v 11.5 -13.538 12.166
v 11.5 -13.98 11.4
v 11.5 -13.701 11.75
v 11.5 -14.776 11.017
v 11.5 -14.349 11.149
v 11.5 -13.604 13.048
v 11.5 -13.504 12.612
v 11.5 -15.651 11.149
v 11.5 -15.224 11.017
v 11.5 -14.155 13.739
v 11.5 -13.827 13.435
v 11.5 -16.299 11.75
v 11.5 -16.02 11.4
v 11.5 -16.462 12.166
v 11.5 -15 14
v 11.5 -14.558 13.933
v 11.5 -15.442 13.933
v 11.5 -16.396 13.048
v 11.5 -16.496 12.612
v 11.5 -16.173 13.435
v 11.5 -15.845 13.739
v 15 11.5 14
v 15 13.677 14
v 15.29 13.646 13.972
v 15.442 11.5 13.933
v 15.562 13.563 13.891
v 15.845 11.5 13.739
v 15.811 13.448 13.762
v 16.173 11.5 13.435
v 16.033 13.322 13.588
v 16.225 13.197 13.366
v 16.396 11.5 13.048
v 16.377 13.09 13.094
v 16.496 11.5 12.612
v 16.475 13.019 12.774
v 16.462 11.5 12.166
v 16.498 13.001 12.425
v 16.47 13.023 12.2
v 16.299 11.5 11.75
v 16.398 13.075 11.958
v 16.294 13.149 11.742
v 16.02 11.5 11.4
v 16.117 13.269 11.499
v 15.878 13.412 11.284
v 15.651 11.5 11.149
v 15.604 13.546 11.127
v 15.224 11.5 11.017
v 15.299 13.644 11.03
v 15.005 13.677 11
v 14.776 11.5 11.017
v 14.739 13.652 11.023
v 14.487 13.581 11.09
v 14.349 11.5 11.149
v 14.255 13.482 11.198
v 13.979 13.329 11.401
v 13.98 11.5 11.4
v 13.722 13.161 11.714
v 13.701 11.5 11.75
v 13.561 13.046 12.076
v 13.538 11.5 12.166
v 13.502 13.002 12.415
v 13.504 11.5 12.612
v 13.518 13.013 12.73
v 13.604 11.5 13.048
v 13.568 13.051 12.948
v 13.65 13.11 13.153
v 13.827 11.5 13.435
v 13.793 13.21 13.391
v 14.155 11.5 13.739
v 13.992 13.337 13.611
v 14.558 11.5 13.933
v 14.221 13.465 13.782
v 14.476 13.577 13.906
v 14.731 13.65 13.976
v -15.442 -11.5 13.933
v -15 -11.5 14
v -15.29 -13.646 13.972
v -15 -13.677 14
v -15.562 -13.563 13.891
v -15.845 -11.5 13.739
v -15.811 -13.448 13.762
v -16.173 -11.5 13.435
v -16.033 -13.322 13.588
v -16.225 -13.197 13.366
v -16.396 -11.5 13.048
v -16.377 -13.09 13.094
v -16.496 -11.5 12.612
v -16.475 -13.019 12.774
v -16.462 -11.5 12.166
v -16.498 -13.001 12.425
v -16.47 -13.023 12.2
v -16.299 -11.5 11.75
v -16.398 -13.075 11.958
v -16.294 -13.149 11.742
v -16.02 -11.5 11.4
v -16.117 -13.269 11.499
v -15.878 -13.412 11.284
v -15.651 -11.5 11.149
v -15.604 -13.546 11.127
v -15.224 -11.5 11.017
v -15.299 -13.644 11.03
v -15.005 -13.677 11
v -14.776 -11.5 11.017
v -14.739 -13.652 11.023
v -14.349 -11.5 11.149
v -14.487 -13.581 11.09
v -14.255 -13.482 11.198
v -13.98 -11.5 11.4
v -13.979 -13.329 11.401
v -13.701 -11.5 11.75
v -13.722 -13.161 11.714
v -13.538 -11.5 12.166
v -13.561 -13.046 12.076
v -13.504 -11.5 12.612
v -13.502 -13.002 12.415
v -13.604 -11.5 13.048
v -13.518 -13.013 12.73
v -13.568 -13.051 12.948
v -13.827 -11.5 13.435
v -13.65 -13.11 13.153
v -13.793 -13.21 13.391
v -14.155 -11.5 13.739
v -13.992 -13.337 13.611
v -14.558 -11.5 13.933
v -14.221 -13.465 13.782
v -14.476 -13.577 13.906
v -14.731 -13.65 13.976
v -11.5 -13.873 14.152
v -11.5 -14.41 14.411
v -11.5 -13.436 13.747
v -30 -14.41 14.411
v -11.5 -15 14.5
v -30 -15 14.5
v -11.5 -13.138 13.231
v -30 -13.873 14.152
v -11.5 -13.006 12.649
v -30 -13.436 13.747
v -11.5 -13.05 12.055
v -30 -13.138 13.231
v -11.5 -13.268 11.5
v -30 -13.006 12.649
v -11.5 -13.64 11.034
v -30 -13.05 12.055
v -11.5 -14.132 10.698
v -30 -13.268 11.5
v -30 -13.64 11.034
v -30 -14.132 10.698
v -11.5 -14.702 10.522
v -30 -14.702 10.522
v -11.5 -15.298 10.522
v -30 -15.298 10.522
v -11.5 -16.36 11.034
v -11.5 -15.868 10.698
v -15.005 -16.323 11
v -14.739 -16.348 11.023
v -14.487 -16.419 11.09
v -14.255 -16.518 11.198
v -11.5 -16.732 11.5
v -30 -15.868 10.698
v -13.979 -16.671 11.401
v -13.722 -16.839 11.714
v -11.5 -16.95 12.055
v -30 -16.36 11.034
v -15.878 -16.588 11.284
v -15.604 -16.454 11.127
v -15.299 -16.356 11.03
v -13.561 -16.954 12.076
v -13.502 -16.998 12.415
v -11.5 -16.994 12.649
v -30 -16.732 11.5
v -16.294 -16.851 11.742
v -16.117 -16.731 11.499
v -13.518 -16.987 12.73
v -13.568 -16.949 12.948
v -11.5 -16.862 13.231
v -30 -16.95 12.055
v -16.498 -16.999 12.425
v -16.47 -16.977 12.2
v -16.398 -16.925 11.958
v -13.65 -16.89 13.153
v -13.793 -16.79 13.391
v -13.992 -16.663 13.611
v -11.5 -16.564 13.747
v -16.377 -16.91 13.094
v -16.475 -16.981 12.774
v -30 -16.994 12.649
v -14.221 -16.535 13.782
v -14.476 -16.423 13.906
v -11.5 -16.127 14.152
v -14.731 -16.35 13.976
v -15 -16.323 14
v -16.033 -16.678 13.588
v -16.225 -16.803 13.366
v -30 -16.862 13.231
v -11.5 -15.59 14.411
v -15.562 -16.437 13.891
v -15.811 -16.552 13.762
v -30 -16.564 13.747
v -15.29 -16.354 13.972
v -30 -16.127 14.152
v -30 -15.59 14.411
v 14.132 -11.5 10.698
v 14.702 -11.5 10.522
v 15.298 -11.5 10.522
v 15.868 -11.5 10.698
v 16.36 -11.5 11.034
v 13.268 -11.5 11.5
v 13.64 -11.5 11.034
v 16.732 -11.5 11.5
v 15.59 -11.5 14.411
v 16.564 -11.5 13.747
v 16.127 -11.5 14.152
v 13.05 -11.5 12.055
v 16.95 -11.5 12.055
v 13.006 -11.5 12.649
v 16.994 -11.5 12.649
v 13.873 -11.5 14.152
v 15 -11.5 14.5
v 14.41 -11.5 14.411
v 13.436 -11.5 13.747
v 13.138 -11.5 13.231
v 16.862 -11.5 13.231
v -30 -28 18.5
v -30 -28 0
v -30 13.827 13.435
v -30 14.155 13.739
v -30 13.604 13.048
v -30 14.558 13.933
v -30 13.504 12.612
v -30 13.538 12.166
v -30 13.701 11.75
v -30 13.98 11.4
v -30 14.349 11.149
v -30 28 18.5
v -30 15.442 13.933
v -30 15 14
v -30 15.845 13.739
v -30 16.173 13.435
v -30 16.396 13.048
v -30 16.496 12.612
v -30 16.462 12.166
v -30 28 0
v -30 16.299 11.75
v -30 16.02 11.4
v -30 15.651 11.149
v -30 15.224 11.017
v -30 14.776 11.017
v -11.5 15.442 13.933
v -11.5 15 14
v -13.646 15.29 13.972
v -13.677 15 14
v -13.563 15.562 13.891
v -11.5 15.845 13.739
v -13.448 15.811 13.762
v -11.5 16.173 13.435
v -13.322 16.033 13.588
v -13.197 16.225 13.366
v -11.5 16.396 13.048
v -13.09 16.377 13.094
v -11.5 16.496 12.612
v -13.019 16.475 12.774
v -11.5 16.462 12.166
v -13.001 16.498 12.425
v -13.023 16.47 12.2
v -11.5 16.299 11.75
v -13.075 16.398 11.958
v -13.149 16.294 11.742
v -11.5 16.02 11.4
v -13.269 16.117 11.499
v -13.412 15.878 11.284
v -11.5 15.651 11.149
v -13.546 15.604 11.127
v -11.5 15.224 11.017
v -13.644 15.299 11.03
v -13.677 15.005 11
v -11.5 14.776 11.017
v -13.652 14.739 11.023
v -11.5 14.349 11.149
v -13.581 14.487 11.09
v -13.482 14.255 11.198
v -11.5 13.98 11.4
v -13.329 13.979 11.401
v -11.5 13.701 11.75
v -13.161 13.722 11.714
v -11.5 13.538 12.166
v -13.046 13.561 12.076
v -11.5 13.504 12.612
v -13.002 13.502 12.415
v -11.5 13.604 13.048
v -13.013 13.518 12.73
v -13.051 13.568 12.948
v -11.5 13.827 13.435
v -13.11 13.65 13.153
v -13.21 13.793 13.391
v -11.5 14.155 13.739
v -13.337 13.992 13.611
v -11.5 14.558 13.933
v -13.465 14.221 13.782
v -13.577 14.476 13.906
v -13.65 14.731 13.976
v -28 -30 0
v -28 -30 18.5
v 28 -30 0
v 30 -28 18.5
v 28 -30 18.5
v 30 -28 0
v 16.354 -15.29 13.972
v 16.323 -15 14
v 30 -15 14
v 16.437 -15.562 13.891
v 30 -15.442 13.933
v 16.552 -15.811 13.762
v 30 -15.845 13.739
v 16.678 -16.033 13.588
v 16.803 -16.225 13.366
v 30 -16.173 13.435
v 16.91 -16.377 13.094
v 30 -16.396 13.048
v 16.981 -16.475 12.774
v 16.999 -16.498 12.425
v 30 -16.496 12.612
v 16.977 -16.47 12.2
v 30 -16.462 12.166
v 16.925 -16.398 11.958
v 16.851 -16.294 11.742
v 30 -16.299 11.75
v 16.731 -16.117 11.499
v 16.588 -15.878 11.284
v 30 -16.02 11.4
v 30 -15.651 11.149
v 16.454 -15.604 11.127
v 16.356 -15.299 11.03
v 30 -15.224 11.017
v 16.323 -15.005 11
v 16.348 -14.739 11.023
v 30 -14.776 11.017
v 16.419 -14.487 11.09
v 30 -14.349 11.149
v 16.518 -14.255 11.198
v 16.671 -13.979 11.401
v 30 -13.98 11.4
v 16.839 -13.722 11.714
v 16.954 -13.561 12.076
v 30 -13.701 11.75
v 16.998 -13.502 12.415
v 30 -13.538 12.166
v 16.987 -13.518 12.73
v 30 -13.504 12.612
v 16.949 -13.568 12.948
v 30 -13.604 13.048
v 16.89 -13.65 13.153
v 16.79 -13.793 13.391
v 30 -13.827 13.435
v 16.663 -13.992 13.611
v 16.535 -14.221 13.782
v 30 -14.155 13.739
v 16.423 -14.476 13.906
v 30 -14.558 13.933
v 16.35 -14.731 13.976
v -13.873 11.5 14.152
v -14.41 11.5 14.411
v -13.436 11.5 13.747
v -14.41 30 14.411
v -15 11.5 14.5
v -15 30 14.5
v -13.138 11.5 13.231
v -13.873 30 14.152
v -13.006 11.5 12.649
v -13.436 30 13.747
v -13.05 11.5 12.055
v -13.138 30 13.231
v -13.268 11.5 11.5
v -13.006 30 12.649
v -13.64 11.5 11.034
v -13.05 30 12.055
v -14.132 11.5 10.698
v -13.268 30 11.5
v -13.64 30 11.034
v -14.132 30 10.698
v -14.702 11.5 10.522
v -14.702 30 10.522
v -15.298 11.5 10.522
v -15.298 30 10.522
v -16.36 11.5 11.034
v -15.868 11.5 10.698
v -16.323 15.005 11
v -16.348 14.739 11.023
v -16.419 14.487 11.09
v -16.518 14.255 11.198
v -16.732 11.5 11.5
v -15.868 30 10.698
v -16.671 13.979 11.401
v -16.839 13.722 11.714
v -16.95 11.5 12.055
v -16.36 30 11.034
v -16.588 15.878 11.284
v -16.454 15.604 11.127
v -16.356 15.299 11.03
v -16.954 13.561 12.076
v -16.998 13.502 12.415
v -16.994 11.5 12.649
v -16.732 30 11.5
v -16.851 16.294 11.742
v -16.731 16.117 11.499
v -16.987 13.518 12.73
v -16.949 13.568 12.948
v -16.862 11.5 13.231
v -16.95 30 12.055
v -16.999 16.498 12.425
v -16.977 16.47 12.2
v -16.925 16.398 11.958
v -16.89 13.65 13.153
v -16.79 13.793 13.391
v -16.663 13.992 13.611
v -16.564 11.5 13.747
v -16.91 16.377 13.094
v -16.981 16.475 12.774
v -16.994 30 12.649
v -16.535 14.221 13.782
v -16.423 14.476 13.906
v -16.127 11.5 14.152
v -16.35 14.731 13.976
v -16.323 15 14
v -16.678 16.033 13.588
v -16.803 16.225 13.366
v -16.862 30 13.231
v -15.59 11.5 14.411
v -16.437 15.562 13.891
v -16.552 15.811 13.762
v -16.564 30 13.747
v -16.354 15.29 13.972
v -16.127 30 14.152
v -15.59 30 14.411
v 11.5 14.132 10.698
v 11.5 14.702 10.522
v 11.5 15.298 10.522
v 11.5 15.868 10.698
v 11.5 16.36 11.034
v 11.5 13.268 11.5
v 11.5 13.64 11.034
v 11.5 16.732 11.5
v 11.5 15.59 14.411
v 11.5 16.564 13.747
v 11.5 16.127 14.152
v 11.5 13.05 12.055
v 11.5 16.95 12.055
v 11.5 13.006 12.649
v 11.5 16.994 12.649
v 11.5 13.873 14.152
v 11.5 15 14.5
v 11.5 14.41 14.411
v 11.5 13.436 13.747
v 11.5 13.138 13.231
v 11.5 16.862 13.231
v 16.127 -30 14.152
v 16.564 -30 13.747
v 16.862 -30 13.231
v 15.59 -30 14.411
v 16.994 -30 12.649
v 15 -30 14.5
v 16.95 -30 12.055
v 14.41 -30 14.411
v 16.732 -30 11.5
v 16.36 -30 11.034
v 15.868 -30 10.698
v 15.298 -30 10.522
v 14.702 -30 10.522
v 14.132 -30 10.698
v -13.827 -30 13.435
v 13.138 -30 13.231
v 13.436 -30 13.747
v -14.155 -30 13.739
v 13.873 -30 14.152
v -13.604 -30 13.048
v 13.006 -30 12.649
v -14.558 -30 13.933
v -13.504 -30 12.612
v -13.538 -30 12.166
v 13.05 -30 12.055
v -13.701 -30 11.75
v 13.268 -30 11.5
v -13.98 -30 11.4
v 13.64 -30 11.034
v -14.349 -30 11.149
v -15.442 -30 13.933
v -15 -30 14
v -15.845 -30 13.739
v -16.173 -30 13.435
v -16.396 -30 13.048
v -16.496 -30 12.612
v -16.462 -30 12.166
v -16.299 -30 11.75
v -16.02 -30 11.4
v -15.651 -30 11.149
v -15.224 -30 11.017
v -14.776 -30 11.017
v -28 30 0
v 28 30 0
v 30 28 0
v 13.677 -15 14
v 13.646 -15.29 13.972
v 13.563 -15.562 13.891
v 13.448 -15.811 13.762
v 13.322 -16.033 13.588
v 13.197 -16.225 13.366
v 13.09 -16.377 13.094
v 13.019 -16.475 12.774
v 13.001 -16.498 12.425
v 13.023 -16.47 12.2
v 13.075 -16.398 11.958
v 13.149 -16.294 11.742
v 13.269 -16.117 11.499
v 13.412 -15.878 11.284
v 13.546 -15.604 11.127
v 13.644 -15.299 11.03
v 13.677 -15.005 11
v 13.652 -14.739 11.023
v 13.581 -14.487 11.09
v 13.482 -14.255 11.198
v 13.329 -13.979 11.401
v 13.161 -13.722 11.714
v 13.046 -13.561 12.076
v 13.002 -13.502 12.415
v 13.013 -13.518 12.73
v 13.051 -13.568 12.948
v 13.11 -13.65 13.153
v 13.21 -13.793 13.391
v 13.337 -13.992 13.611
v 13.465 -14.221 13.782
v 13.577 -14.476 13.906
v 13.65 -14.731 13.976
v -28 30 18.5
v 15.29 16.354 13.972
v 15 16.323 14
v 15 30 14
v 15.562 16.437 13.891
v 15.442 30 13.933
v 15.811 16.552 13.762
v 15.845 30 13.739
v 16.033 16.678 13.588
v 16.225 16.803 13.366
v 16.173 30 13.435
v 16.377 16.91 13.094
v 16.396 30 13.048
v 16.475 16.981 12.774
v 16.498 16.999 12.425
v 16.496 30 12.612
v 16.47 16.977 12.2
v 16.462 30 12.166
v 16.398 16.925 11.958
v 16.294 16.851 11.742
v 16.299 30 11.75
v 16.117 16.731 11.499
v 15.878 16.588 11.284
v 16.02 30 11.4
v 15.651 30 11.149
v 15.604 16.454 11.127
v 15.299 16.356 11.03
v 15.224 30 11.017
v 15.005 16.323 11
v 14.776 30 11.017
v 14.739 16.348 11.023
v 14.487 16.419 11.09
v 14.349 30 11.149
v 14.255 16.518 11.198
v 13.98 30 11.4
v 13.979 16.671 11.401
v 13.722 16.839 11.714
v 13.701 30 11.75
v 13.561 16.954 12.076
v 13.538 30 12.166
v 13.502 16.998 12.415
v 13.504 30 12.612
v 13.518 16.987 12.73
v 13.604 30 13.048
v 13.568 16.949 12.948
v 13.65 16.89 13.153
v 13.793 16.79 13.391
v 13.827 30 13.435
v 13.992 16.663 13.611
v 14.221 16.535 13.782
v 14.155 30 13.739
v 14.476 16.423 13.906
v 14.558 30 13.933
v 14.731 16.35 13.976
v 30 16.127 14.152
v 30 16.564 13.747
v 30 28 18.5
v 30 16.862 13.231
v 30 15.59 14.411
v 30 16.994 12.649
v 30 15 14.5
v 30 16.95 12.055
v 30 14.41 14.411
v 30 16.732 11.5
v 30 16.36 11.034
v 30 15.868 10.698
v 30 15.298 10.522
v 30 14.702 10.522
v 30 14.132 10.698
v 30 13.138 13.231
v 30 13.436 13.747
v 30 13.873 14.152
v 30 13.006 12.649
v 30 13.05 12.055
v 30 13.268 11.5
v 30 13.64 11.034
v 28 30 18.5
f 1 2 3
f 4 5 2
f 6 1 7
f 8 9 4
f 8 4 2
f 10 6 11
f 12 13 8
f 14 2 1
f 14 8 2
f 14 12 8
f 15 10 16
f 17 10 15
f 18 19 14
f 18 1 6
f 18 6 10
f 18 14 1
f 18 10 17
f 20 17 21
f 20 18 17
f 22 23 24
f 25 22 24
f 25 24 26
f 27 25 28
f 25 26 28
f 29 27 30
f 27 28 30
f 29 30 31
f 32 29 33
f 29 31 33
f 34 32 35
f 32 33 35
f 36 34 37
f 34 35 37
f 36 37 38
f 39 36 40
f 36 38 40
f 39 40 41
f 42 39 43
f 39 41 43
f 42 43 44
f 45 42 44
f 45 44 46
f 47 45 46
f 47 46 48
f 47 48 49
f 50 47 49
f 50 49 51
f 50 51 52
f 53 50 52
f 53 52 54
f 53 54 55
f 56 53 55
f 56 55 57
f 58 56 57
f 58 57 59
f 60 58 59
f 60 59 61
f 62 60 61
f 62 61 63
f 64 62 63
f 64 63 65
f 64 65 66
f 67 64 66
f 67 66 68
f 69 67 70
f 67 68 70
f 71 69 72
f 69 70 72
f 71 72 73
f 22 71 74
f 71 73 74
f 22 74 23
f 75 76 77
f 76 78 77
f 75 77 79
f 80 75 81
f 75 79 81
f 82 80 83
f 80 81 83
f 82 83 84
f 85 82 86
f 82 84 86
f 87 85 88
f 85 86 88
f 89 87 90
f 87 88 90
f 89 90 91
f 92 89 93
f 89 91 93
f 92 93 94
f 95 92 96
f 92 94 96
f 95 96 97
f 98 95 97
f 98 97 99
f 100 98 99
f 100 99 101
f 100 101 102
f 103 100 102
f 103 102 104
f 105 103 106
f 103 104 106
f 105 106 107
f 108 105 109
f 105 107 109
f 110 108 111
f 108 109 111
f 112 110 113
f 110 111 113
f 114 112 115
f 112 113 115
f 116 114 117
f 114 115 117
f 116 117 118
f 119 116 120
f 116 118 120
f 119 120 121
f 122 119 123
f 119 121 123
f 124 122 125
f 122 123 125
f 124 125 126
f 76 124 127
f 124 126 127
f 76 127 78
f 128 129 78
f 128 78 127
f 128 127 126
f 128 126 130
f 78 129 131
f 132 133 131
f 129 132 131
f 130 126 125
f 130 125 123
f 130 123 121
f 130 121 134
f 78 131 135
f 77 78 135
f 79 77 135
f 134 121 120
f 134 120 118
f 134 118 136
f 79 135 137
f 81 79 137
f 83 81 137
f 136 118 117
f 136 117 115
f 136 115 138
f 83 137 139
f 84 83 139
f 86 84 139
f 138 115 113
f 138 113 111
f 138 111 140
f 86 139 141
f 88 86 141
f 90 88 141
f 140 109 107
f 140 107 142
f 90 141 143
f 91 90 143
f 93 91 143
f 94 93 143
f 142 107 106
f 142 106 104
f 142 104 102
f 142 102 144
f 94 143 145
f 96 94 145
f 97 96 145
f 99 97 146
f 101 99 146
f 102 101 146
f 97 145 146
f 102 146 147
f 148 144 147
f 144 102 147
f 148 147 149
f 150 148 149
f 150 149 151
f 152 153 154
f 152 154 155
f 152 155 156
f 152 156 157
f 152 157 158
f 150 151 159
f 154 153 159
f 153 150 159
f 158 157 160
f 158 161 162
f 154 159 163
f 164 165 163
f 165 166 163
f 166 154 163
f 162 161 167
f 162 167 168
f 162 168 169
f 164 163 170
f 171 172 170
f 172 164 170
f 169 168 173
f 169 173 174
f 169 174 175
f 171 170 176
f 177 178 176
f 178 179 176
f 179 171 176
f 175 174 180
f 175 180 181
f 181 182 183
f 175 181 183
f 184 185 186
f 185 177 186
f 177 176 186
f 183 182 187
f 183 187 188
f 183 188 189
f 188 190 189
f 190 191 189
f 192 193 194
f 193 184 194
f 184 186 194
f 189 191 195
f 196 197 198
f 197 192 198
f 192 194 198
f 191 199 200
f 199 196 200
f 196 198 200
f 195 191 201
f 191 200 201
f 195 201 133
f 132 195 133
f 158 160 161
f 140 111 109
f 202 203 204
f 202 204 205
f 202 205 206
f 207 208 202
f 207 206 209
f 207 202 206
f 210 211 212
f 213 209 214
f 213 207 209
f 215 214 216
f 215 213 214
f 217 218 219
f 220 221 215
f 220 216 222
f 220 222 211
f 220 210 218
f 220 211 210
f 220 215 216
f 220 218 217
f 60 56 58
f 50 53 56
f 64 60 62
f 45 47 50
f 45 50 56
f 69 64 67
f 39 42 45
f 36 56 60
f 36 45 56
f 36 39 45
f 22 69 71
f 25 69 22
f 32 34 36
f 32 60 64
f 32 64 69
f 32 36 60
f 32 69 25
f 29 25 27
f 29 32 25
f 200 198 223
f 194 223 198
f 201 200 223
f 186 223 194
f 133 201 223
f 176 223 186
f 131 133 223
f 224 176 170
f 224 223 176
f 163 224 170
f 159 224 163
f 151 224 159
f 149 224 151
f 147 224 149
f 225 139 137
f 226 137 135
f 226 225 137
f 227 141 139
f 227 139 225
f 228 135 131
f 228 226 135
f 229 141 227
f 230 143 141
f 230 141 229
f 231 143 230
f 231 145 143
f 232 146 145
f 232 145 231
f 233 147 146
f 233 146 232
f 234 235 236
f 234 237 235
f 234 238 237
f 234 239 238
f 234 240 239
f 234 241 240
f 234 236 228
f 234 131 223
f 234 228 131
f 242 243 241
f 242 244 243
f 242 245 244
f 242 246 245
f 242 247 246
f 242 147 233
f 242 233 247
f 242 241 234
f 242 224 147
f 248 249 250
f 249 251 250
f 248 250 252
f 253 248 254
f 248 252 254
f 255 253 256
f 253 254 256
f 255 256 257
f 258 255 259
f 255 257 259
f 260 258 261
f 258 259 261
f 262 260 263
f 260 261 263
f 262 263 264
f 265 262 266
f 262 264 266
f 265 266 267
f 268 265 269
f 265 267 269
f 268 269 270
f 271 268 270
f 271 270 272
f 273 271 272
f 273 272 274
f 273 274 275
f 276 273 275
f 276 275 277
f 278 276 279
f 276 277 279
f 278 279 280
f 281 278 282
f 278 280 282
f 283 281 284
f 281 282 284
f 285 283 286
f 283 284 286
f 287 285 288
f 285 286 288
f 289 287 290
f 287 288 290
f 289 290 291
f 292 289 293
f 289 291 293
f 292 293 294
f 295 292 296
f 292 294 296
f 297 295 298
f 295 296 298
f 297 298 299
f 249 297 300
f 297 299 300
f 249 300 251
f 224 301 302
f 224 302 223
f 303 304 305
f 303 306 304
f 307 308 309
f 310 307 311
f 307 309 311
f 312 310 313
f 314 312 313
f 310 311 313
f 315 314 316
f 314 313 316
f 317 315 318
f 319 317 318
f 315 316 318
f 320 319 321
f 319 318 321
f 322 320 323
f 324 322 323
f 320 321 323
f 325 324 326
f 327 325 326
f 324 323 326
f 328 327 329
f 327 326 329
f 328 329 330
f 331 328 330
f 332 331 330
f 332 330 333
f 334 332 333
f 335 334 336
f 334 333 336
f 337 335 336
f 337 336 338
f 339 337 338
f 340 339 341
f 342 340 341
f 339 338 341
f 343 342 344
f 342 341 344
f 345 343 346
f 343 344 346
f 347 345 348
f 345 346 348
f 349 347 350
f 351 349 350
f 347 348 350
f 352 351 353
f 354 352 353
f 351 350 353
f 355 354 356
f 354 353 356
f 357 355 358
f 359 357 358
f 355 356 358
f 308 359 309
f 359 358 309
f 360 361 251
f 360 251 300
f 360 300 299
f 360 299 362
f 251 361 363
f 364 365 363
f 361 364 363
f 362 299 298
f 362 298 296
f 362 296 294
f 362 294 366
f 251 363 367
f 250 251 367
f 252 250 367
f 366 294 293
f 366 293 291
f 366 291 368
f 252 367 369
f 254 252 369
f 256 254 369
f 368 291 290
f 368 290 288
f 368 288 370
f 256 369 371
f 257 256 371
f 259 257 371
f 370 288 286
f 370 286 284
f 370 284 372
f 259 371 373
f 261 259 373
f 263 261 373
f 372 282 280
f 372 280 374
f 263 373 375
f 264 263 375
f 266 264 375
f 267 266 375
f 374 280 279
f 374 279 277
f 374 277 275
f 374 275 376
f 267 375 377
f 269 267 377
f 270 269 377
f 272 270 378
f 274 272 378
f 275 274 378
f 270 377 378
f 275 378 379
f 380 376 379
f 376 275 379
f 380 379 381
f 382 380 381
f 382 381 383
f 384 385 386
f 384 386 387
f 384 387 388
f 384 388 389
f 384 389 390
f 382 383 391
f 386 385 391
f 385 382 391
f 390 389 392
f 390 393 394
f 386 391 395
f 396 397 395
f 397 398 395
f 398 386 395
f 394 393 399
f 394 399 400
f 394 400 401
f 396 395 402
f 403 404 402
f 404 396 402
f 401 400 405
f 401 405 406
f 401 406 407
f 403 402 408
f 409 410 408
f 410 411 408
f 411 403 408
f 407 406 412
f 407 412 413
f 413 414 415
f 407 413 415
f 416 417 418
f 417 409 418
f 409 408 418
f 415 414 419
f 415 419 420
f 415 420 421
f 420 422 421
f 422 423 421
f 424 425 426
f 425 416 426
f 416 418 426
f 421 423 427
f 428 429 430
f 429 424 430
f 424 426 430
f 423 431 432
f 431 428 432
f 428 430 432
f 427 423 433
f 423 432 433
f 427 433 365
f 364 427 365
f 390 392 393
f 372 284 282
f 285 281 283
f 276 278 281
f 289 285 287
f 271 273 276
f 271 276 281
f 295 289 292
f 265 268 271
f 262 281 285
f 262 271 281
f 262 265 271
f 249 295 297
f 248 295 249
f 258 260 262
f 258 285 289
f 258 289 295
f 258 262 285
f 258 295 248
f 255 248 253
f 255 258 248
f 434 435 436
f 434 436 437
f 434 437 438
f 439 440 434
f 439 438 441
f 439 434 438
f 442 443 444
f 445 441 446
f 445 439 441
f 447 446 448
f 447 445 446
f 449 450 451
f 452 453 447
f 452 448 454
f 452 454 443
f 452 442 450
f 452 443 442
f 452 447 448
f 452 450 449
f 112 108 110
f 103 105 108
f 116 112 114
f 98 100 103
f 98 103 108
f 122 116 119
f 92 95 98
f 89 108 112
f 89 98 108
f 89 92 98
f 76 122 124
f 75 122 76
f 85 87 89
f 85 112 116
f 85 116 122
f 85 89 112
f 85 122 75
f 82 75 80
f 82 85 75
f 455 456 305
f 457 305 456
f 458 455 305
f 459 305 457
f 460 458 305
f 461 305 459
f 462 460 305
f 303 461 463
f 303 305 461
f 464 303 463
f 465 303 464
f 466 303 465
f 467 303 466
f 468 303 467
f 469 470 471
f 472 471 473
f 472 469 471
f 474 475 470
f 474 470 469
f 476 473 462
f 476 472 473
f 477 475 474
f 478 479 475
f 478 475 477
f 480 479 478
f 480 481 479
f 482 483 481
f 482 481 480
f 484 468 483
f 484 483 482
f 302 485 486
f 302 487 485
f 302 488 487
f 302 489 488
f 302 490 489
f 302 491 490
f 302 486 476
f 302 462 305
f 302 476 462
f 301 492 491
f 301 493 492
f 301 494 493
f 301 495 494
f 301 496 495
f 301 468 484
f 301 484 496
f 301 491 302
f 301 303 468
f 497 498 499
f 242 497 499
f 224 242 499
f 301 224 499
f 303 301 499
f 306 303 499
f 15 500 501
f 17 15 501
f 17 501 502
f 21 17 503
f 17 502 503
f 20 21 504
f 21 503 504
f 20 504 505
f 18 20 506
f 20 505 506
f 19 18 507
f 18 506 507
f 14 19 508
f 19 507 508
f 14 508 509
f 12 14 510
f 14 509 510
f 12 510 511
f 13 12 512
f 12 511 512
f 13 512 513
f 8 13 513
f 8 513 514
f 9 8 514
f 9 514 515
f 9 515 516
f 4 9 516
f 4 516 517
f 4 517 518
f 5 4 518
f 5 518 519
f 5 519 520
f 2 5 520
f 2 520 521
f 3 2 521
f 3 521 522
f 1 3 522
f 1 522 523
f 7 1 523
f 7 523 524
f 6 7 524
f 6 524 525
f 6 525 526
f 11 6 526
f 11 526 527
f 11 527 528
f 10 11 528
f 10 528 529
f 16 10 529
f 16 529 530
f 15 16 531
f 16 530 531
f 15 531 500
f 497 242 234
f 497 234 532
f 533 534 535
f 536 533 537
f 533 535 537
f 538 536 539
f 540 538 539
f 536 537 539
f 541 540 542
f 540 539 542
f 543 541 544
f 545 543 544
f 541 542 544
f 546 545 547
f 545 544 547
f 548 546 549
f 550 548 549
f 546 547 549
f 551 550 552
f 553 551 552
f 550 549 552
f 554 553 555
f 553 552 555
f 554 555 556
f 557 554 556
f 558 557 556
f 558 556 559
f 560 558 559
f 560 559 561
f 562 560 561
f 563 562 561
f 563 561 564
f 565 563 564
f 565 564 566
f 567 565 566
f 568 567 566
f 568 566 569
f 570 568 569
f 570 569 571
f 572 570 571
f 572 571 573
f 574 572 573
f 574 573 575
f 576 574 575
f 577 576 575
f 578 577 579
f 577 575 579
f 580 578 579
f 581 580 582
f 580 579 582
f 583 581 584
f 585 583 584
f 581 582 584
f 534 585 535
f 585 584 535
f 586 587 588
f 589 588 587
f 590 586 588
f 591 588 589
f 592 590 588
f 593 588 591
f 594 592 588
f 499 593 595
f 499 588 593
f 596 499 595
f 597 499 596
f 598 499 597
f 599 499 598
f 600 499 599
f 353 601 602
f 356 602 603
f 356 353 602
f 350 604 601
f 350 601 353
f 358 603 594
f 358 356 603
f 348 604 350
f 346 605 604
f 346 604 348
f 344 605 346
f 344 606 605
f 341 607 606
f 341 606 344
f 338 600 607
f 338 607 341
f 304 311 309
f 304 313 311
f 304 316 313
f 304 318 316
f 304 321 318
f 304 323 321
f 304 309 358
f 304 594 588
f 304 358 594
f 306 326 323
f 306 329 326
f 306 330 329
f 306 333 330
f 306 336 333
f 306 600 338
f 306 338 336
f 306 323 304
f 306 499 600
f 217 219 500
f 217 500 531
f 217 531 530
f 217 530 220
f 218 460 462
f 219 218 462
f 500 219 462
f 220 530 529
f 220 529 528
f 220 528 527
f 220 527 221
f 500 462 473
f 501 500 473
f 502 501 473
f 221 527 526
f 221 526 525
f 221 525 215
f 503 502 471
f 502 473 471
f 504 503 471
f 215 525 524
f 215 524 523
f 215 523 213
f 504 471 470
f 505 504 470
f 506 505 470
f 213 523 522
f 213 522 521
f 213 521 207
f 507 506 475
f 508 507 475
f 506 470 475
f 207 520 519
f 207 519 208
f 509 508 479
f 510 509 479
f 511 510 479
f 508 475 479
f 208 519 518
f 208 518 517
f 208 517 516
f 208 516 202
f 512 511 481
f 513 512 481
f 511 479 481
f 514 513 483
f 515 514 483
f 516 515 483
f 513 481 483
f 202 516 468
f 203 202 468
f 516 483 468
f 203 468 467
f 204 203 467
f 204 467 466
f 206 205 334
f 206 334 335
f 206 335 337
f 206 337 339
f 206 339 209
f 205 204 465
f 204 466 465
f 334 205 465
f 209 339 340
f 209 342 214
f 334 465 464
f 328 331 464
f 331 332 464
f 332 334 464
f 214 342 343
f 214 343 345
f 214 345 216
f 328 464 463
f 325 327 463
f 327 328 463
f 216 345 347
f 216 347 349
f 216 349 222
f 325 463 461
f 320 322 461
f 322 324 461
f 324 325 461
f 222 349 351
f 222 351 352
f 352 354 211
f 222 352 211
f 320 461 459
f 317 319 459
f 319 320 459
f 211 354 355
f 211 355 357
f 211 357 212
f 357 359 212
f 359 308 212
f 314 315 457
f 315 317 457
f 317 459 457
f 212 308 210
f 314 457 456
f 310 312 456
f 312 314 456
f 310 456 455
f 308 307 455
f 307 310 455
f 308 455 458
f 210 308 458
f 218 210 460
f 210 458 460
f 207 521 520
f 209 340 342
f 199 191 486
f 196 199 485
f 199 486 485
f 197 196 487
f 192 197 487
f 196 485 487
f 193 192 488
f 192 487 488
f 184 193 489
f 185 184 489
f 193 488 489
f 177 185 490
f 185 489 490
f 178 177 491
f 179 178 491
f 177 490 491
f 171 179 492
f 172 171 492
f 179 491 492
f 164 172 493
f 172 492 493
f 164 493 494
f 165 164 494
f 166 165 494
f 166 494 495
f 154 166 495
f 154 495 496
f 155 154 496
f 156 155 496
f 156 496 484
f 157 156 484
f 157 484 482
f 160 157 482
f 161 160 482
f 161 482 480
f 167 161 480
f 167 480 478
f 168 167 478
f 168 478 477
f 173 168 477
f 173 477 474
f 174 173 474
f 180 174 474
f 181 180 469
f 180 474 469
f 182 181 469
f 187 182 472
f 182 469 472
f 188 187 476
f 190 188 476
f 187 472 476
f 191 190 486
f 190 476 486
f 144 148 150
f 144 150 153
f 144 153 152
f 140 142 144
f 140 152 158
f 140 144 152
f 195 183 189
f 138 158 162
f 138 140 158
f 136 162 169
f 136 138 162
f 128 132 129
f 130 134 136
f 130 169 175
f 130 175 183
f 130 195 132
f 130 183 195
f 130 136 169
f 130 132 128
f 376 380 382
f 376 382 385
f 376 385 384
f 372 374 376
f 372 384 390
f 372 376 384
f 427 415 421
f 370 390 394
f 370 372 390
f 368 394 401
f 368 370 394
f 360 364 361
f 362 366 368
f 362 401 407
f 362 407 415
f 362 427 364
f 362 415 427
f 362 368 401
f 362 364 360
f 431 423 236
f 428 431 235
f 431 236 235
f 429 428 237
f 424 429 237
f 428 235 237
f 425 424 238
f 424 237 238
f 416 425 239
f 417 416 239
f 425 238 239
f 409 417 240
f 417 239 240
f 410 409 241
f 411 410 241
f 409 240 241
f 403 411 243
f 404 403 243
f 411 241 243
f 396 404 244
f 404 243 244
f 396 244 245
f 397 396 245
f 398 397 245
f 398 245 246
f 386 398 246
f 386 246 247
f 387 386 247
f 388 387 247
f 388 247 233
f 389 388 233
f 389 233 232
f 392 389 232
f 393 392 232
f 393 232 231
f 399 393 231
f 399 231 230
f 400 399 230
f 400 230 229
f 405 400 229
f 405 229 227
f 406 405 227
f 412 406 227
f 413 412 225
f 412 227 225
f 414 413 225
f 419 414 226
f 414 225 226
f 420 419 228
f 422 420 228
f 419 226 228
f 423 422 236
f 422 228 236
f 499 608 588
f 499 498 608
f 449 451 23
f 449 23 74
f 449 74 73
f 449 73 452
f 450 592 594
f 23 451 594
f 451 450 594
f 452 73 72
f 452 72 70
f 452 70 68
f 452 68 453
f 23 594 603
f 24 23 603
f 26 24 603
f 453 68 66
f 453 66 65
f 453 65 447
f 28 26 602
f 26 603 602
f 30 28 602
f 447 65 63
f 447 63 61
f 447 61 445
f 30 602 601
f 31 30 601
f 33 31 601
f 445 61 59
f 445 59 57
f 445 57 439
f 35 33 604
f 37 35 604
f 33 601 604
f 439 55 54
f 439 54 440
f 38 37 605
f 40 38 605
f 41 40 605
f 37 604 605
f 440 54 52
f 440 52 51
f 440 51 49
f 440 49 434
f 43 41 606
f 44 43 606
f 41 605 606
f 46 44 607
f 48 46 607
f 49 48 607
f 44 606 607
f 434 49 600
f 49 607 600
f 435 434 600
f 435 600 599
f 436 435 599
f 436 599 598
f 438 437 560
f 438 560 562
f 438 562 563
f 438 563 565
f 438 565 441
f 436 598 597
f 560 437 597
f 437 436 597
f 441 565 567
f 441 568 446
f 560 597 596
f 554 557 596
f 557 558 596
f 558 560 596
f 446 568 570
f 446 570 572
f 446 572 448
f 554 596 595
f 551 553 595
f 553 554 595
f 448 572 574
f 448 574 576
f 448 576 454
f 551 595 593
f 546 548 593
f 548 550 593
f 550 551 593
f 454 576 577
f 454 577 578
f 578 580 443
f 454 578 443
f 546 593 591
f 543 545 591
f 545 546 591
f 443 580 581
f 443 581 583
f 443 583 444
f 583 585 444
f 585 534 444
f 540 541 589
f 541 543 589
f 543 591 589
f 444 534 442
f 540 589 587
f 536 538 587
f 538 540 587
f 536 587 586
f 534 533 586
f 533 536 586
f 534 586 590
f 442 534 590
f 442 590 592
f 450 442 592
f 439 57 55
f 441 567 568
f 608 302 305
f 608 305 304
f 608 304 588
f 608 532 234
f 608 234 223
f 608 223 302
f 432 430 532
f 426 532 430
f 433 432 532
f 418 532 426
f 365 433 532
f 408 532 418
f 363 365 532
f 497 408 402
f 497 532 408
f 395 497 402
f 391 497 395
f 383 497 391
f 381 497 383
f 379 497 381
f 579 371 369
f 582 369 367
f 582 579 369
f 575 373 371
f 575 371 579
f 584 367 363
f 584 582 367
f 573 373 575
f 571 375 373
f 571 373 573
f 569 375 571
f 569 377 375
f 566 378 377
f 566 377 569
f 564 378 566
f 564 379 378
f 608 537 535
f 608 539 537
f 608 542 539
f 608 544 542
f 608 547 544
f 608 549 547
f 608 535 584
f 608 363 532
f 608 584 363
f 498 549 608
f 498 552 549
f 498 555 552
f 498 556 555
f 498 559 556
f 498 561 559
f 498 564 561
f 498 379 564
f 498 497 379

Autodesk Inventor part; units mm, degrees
ref_plane "YZ Plane" through (0, 0, 0) normal (1, 0, 0) x (0, 1, 0)
ref_plane "XZ Plane" through (0, 0, 0) normal (0, 1, 0) x (-1, 0, 0)
ref_plane "XY Plane" through (0, 0, 0) normal (0, 0, 1) x (1, 0, 0)
ref_plane "Work Plane1" through (0, 0, 0) normal (0, 0, 1) x (1, 0, 0)
sketch "Sketch1" plane through (0, 0, 0) normal (0, 0, 1) x (1, 0, 0)
  circle A0 centre (0, 0) radius 7.5 projected
  line L0 (-30, 28) -> (-28, 30) projected
  line L1 (-30, -28) -> (-30, 28) projected
  line L2 (-28, -30) -> (-30, -28) projected
  line L3 (28, -30) -> (-28, -30) projected
  line L4 (30, -28) -> (28, -30) projected
  line L5 (30, 28) -> (30, -28) projected
  line L6 (28, 30) -> (30, 28) projected
  line L7 (-28, 30) -> (28, 30) projected
  circle A1 centre (25, 25) radius 2.325 projected
  circle A2 centre (-25, -25) radius 2.325 projected
  circle A3 centre (25, -25) radius 2.325 projected
  circle A4 centre (-25, 25) radius 2.325 projected
  point P0 (0, 0)
extrude "Extrusion1" add sketch "Sketch1" along normal blind 18.5 contours A0 | L0 L7 L6 L5 L4 L3 L2 L1 | A1 | A2 | A3 | A4
sketch "Sketch2" plane through (0, 0, 18.5) normal (0, 0, 1) x (1, 0, 0)
  point P0 (0, 0)
sketch "Sketch3" plane through (30, -28, 0) normal (1, 0, 0) x (0, 0, -1)
  line L0 (0, 56) -> (0, 0) projected
  line L1 (0, 56) -> (-18.5, 56) projected
  line L2 (-18.5, 0) -> (-18.5, 56) projected
  line L3 (0, 0) -> (-18.5, 0) projected
  line L4 (-18.5, 0) -> (-18.5, 56) projected
  line L5 (0, 47.2331) -> (-18.5, 47.2331)
  line L6 (-18.5, 47.2331) -> (-18.5, 36.3051)
  line L7 (-18.5, 36.3051) -> (0, 36.3051)
  line L8 (0, 36.3051) -> (0, 47.2331)
  line L9 (0, 56) -> (0, 0) projected
  line L10 (0, 10.2066) -> (-18.5, 10.2066)
  line L11 (-18.5, 10.2066) -> (-18.5, 18.9489)
  line L12 (-18.5, 18.9489) -> (0, 18.9489)
  line L13 (0, 18.9489) -> (0, 10.2066)
  point P0 (0, 28)
extrude "Extrusion2" [suppressed]
sketch "Sketch4" plane through (30, 19.2331, 16) normal (0, 1, 0) x (1, 0, 0)
  line L0 (0, 0) -> (0, 16) projected
  line L1 (0, 0) -> (14, 0) projected
  line L2 (14, 16) -> (14, 0) projected
  line L3 (0, 16) -> (14, 16) projected
  circle A0 centre (7, 5) radius 1.5
  point P0 (-30, 16)
  dimension "d4" = 3
extrude "Extrusion3" [suppressed]
pattern_circular "Circular Pattern1" [suppressed]
sketch "Sketch5" plane through (-30, -28, 0) normal (-1, 0, 0) x (0, 0, 1)
  circle A0 centre (12.5, 43) radius 1.5
  line L0 (18.5, 56) -> (18.5, 0) projected
  line L1 (0, 58) -> (18.5, 58) projected
  circle A1 centre (12.5, 13) radius 2
  line L2 (0, -2) -> (18.5, -2) projected
  point P0 (0, 28)
  dimension "d10" = 3
  dimension "d11" = 6
  dimension "d12" = 15
  dimension "d13" = 4
  dimension "d14" = 6
  dimension "d15" = 15
extrude "Extrusion4" cut sketch "Sketch5" against normal blind 18.5
pattern_circular "Circular Pattern2" count 4 over 360 about axis through (0, 0, 0) along (0, 0, 1) of "Extrusion4"
properties part number "00_XY_stage-CHUO_SEIKI_LD-647-R1-Middle"
